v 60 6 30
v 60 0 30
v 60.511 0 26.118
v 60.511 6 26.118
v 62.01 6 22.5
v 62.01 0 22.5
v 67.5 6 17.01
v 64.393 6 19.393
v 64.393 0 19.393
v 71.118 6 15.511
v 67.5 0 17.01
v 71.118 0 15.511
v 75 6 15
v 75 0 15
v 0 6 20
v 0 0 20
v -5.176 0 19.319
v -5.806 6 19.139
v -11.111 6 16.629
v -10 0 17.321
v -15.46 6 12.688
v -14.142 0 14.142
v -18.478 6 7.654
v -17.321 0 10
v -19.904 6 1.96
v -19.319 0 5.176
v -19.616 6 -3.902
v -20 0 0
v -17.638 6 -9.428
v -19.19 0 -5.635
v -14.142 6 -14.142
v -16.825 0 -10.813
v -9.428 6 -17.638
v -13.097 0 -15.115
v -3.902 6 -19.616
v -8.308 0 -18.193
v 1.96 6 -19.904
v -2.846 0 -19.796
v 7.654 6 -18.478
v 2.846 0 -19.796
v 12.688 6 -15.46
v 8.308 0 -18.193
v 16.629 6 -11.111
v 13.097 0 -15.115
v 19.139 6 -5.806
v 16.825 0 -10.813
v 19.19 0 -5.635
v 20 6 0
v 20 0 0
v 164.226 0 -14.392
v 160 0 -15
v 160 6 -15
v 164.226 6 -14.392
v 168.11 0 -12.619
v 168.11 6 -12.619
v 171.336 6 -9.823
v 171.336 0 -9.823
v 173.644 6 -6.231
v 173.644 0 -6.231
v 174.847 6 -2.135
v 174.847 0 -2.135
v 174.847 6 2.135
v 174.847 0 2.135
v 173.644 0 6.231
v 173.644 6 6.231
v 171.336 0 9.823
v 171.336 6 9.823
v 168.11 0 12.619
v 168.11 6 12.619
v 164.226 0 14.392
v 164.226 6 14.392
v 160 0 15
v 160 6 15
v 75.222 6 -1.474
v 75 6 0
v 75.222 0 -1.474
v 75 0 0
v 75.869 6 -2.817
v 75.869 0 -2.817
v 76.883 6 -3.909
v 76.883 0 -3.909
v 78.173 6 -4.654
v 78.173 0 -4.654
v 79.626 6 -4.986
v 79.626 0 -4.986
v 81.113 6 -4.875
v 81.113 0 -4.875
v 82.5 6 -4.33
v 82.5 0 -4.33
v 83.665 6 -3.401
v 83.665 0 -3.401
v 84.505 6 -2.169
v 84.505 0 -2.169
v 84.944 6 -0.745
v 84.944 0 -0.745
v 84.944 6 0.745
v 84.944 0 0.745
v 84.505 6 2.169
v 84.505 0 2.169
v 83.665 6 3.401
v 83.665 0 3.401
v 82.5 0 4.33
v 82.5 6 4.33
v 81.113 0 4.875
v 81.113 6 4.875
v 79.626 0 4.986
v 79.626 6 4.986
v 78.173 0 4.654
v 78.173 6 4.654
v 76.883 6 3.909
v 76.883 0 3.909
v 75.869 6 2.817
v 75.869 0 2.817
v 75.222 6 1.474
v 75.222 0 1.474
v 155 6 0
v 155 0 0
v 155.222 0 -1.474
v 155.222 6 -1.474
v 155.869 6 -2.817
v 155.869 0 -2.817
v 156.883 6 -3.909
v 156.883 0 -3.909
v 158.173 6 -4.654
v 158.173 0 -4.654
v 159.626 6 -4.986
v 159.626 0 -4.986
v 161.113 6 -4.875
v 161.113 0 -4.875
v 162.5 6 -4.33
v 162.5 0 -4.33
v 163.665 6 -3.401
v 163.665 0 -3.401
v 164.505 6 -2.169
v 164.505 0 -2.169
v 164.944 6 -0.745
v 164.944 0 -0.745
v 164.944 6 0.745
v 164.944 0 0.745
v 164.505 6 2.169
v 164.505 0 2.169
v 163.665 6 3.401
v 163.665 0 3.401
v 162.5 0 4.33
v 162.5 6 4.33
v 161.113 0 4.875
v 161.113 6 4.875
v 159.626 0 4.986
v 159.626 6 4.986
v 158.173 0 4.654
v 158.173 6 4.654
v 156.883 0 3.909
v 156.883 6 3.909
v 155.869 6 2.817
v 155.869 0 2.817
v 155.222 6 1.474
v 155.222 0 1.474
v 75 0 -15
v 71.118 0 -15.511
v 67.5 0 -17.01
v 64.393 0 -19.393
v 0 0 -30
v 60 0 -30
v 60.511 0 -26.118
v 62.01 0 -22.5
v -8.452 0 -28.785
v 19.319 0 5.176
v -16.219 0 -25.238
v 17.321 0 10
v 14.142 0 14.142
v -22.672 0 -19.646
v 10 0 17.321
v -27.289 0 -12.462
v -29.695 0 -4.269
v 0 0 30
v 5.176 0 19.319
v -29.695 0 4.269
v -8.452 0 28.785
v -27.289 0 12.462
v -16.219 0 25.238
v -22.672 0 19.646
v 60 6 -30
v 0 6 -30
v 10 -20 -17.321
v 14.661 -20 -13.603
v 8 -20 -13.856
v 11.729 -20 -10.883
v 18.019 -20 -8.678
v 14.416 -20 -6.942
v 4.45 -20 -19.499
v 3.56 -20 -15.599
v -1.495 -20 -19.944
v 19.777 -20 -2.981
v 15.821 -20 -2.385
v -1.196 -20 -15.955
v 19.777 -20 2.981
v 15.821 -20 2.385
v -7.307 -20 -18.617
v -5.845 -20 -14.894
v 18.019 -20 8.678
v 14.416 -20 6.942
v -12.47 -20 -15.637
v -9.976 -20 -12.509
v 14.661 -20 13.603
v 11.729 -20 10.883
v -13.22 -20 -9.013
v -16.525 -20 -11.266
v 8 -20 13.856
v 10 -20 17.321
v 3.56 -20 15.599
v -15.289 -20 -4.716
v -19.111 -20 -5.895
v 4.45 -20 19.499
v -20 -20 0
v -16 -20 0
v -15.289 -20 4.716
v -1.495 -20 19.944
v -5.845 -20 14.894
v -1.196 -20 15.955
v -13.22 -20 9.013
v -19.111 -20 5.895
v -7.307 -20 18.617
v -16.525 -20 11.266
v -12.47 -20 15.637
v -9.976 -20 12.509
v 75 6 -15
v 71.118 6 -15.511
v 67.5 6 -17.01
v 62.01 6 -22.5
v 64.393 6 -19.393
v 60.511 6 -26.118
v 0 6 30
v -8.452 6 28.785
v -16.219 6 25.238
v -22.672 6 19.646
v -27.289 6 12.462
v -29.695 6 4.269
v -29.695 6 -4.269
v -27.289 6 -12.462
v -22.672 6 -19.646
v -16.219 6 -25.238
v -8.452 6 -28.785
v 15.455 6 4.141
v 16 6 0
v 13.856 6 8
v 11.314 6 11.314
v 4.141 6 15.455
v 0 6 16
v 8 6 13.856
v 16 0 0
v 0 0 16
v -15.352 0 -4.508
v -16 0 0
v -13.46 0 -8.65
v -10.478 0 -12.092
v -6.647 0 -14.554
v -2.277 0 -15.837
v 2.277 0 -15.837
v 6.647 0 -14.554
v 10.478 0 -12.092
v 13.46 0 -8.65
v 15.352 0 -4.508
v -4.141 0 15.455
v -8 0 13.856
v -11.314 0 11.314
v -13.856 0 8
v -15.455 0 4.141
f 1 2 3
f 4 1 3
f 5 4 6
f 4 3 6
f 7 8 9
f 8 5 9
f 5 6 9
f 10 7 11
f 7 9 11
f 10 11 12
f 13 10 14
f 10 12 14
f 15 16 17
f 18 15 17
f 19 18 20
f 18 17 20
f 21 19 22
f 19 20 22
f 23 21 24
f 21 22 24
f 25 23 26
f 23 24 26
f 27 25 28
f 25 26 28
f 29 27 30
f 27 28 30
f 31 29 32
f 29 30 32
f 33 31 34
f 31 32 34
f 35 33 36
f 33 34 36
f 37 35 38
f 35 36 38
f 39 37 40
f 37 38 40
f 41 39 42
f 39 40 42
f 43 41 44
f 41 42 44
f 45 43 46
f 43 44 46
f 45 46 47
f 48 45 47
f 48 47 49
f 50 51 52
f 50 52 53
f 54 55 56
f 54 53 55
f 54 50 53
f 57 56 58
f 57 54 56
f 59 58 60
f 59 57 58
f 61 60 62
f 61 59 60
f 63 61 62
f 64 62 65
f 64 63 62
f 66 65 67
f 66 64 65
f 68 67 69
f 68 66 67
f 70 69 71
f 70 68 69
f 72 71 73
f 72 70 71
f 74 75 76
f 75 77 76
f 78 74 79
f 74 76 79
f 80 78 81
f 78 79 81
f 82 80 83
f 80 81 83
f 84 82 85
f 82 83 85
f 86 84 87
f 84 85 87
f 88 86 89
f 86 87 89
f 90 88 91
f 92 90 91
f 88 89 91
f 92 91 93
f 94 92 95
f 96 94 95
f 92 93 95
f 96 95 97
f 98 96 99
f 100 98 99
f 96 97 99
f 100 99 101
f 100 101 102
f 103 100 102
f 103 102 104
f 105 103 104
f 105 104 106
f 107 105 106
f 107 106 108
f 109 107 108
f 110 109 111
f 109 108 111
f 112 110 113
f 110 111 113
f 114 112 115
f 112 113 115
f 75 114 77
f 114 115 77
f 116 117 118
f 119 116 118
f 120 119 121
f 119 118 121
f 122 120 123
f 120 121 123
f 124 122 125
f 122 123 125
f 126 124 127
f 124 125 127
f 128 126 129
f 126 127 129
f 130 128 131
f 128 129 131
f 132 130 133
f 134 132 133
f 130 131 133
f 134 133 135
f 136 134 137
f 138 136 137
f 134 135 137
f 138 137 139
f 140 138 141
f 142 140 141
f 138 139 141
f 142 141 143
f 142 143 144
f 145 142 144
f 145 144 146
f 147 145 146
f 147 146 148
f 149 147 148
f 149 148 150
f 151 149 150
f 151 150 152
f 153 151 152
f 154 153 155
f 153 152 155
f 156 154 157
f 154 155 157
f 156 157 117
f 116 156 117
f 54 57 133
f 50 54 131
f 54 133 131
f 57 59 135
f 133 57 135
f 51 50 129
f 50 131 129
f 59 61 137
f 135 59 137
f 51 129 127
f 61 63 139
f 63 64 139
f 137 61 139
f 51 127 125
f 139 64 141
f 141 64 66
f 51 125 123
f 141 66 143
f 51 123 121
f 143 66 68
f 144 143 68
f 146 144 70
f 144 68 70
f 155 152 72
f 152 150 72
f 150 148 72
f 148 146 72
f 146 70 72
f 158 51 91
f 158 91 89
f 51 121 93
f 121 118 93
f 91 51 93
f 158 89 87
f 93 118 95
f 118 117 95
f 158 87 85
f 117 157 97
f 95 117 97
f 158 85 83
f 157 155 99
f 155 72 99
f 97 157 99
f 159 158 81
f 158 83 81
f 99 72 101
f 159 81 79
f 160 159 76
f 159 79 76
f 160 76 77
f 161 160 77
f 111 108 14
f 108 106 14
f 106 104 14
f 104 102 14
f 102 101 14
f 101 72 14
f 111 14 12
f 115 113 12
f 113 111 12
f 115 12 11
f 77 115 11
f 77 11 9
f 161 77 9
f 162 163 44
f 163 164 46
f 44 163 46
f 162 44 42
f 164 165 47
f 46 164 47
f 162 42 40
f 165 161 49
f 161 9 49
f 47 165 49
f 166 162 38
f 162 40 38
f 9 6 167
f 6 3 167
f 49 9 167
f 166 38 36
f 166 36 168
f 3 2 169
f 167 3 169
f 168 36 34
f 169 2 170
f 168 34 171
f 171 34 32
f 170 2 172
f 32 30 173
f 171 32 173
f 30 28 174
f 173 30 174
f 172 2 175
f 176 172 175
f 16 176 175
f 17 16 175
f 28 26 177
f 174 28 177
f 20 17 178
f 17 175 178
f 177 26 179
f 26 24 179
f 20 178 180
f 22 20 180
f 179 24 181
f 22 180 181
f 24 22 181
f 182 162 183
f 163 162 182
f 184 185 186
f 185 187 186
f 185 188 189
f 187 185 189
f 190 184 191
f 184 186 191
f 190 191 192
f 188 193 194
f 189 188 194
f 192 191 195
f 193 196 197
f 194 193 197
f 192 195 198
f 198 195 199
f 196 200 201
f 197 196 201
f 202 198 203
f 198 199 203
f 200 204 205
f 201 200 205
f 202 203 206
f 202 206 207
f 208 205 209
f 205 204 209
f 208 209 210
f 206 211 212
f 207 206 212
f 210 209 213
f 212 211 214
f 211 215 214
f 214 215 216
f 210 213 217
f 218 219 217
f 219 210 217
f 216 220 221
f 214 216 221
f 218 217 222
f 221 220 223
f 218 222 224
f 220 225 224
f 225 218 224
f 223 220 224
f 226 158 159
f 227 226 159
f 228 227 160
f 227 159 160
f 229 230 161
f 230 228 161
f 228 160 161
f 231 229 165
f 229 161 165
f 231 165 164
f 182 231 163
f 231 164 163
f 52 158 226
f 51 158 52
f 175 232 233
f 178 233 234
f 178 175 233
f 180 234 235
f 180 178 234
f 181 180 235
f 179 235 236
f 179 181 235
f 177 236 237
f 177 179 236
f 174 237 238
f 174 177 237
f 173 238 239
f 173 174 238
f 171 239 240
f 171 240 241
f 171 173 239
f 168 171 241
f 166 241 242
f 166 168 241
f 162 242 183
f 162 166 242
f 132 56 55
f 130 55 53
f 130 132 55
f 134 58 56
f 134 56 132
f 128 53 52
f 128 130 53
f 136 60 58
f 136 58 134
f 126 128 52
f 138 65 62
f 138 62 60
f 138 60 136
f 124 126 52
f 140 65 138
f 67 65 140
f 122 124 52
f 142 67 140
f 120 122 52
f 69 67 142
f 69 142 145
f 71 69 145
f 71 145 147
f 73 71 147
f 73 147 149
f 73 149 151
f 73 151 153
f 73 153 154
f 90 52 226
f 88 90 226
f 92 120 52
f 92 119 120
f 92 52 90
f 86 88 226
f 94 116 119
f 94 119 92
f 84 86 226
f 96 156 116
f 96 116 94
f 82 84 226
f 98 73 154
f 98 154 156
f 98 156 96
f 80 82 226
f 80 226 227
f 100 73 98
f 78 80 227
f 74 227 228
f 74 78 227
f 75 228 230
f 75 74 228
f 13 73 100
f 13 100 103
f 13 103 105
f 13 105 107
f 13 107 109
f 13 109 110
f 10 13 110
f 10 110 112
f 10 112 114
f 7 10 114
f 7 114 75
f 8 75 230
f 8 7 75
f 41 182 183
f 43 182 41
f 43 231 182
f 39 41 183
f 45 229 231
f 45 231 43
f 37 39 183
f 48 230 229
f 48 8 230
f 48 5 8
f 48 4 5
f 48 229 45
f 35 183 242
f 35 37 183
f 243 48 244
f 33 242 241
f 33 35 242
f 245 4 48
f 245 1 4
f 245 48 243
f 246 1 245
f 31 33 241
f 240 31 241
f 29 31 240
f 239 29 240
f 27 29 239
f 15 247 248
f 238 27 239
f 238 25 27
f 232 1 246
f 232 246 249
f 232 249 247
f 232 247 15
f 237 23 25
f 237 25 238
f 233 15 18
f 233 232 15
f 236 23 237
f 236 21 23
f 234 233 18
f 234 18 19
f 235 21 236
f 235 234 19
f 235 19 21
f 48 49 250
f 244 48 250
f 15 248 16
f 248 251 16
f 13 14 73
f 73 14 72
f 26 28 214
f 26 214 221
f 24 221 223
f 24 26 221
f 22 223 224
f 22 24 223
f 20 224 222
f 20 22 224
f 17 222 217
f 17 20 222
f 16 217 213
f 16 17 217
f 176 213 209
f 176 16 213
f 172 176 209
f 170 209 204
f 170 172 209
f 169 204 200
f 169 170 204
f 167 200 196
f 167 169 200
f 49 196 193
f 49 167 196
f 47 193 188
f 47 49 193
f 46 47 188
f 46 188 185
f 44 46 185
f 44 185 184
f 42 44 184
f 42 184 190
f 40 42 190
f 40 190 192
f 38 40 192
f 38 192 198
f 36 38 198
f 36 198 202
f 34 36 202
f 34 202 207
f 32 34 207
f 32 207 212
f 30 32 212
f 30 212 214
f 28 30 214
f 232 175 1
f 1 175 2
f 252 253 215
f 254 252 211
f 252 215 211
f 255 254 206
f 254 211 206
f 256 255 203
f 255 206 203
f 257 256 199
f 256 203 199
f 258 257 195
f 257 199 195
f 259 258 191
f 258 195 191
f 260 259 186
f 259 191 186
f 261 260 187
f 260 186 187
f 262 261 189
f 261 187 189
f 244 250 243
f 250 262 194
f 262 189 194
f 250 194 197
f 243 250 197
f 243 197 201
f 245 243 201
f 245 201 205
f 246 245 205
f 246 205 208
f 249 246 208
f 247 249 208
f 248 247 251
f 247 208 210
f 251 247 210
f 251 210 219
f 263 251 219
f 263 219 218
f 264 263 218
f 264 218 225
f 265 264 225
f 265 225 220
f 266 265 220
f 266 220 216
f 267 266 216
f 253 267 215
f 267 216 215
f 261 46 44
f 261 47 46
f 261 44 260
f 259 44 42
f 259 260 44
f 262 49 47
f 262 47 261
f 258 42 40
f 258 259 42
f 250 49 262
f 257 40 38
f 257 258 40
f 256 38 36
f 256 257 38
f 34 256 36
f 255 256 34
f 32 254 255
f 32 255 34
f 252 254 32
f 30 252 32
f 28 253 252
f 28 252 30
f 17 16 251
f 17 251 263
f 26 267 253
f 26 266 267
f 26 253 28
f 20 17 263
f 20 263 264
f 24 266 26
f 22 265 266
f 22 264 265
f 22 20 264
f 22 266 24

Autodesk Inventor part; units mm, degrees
ref_plane "YZ Plane" through (0, 0, 0) normal (1, 0, 0) x (0, 1, 0)
ref_plane "XZ Plane" through (0, 0, 0) normal (0, 1, 0) x (-1, 0, 0)
ref_plane "XY Plane" through (0, 0, 0) normal (0, 0, 1) x (1, 0, 0)
sketch "Sketch1" plane through (0, 0, 0) normal (0, 1, 0) x (-1, 0, 0)
  line L0 (0, -42) -> (0, 42) projected
  line L1 (-216, 0) -> (71, 0) projected
  circle A0 centre (0, 0) radius 16
  circle A1 centre (0, 0) radius 20
  arc A2 (0, -30) -> (0, 30) centre (0, 0) ccw
  line L2 (0, 30) -> (-60, 30)
  arc A3 (-75, 15) -> (-60, 30) centre (-75, 30) ccw
  line L3 (-75, 15) -> (-160, 15)
  arc A4 (-160, 15) -> (-160, -15) centre (-160, 0) ccw
  line L4 (0, -30) -> (-60, -30)
  arc A5 (-60, -30) -> (-75, -15) centre (-75, -30) ccw
  line L5 (-75, -15) -> (-160, -15)
  circle A6 centre (-160, 0) radius 5
  circle A7 centre (-80, 0) radius 5
  point P0 (0, 20)
  point P1 (0, 16)
  point P2 (-16, 0)
  point P3 (-20, 0)
  dimension "d0" = 30
  dimension "d1" = 40
  dimension "d2" = 4
  dimension "d3" = 10
  dimension "d4" = 80
  dimension "d5" = 60
  dimension "d6" = 160
  dimension "d8" = 15
  dimension "d10" = 15
extrude "Extrusion1" add sketch "Sketch1" along normal blind 6 contours L4 A5 L5 A4 L1 A6 A7 A1 L0 | L0 A1 L1 A2 | A1 L1 A0 L0 | L0 A0 L1 A1 | L1 A1 L0 A2 | A1 L0 A0 L1 | L1 A7 A6 A4 L3 A3 L2 L0 A1 | L1 A0 L0 A1
extrude "Extrusion2" add sketch "Sketch1" against normal blind 20 contours A1 L1 A0 L0 | L0 A0 L1 A1 | A1 L0 A0 L1 | L1 A0 L0 A1
extrude "Extrusion3" cut sketch "Sketch1" along normal through all contours A1 L1 A0 L0 | L0 A0 L1 A1 | L1 A0 L0 A1 | L1 A0 L0 picked at (-18.3658, -2.6703) picked at (17.7056, -5.5628) picked at (18.4995, 1.4835) picked at (-10.5329, 1.1868)
properties part number "Shared Sketch"
